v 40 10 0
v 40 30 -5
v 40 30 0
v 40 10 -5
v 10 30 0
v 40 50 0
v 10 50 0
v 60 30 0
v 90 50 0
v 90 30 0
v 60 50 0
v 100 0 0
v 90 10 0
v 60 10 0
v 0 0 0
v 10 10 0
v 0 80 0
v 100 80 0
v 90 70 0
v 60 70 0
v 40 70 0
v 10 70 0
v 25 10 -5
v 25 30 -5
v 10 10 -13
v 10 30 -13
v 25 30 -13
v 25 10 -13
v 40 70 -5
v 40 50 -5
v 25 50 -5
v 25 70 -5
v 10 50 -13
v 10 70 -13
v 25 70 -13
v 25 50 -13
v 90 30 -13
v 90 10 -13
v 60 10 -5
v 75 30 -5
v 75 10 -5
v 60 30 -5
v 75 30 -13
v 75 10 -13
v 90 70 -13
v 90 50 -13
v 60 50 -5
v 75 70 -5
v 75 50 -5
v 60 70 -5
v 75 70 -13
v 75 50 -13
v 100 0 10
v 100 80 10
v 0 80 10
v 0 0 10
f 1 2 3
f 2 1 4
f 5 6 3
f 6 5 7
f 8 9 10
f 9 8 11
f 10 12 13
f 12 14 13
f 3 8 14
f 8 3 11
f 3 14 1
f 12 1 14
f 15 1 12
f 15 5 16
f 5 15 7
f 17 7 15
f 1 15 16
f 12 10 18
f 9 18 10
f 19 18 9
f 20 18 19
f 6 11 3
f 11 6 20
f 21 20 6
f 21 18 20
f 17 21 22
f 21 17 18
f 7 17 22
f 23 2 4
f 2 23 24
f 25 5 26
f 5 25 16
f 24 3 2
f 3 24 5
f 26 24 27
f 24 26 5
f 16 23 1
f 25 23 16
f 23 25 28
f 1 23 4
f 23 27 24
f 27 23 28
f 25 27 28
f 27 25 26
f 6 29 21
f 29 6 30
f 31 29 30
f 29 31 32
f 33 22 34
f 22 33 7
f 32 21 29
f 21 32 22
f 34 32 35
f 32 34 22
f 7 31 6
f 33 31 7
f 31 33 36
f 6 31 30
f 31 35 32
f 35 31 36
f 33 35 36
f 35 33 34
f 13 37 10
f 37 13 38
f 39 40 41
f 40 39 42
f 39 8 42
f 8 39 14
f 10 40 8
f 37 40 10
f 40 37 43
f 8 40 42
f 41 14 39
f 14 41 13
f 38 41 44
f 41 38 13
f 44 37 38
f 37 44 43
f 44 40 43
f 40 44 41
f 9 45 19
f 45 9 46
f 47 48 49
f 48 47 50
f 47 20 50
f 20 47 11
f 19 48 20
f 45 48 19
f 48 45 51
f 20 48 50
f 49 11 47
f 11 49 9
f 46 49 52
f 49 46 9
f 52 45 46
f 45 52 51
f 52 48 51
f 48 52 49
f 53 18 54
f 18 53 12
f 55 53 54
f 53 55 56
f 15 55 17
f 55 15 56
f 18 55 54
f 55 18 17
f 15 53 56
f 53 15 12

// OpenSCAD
// Parameters
slab_length = 100;
slab_width = 80;
slab_thickness = 10;

pad_width = 30;
pad_depth = 20;
pad_thickness = 5;
pad_inset = 10; // Distance from slab edge to pad edge

deeper_width = 15;
deeper_thickness = 8;

$fn = 100;

// Main slab
cube([slab_length, slab_width, slab_thickness]);

// Shallow pads near corners
for (x = [pad_inset, slab_length - pad_inset - pad_width]) {
    for (y = [pad_inset, slab_width - pad_inset - pad_depth]) {
        // Shallow pad
        translate([x, y, -pad_thickness])
            cube([pad_width, pad_depth, pad_thickness]);
        
        // Deeper continuation (aligned to left edge of pad for left pads, right edge for right pads)
        if (x == pad_inset) {
            // Left pads: deeper part on left edge
            translate([x, y, -pad_thickness - deeper_thickness])
                cube([deeper_width, pad_depth, deeper_thickness]);
        } else {
            // Right pads: deeper part on right edge
            translate([x + pad_width - deeper_width, y, -pad_thickness - deeper_thickness])
                cube([deeper_width, pad_depth, deeper_thickness]);
        }
    }
}
